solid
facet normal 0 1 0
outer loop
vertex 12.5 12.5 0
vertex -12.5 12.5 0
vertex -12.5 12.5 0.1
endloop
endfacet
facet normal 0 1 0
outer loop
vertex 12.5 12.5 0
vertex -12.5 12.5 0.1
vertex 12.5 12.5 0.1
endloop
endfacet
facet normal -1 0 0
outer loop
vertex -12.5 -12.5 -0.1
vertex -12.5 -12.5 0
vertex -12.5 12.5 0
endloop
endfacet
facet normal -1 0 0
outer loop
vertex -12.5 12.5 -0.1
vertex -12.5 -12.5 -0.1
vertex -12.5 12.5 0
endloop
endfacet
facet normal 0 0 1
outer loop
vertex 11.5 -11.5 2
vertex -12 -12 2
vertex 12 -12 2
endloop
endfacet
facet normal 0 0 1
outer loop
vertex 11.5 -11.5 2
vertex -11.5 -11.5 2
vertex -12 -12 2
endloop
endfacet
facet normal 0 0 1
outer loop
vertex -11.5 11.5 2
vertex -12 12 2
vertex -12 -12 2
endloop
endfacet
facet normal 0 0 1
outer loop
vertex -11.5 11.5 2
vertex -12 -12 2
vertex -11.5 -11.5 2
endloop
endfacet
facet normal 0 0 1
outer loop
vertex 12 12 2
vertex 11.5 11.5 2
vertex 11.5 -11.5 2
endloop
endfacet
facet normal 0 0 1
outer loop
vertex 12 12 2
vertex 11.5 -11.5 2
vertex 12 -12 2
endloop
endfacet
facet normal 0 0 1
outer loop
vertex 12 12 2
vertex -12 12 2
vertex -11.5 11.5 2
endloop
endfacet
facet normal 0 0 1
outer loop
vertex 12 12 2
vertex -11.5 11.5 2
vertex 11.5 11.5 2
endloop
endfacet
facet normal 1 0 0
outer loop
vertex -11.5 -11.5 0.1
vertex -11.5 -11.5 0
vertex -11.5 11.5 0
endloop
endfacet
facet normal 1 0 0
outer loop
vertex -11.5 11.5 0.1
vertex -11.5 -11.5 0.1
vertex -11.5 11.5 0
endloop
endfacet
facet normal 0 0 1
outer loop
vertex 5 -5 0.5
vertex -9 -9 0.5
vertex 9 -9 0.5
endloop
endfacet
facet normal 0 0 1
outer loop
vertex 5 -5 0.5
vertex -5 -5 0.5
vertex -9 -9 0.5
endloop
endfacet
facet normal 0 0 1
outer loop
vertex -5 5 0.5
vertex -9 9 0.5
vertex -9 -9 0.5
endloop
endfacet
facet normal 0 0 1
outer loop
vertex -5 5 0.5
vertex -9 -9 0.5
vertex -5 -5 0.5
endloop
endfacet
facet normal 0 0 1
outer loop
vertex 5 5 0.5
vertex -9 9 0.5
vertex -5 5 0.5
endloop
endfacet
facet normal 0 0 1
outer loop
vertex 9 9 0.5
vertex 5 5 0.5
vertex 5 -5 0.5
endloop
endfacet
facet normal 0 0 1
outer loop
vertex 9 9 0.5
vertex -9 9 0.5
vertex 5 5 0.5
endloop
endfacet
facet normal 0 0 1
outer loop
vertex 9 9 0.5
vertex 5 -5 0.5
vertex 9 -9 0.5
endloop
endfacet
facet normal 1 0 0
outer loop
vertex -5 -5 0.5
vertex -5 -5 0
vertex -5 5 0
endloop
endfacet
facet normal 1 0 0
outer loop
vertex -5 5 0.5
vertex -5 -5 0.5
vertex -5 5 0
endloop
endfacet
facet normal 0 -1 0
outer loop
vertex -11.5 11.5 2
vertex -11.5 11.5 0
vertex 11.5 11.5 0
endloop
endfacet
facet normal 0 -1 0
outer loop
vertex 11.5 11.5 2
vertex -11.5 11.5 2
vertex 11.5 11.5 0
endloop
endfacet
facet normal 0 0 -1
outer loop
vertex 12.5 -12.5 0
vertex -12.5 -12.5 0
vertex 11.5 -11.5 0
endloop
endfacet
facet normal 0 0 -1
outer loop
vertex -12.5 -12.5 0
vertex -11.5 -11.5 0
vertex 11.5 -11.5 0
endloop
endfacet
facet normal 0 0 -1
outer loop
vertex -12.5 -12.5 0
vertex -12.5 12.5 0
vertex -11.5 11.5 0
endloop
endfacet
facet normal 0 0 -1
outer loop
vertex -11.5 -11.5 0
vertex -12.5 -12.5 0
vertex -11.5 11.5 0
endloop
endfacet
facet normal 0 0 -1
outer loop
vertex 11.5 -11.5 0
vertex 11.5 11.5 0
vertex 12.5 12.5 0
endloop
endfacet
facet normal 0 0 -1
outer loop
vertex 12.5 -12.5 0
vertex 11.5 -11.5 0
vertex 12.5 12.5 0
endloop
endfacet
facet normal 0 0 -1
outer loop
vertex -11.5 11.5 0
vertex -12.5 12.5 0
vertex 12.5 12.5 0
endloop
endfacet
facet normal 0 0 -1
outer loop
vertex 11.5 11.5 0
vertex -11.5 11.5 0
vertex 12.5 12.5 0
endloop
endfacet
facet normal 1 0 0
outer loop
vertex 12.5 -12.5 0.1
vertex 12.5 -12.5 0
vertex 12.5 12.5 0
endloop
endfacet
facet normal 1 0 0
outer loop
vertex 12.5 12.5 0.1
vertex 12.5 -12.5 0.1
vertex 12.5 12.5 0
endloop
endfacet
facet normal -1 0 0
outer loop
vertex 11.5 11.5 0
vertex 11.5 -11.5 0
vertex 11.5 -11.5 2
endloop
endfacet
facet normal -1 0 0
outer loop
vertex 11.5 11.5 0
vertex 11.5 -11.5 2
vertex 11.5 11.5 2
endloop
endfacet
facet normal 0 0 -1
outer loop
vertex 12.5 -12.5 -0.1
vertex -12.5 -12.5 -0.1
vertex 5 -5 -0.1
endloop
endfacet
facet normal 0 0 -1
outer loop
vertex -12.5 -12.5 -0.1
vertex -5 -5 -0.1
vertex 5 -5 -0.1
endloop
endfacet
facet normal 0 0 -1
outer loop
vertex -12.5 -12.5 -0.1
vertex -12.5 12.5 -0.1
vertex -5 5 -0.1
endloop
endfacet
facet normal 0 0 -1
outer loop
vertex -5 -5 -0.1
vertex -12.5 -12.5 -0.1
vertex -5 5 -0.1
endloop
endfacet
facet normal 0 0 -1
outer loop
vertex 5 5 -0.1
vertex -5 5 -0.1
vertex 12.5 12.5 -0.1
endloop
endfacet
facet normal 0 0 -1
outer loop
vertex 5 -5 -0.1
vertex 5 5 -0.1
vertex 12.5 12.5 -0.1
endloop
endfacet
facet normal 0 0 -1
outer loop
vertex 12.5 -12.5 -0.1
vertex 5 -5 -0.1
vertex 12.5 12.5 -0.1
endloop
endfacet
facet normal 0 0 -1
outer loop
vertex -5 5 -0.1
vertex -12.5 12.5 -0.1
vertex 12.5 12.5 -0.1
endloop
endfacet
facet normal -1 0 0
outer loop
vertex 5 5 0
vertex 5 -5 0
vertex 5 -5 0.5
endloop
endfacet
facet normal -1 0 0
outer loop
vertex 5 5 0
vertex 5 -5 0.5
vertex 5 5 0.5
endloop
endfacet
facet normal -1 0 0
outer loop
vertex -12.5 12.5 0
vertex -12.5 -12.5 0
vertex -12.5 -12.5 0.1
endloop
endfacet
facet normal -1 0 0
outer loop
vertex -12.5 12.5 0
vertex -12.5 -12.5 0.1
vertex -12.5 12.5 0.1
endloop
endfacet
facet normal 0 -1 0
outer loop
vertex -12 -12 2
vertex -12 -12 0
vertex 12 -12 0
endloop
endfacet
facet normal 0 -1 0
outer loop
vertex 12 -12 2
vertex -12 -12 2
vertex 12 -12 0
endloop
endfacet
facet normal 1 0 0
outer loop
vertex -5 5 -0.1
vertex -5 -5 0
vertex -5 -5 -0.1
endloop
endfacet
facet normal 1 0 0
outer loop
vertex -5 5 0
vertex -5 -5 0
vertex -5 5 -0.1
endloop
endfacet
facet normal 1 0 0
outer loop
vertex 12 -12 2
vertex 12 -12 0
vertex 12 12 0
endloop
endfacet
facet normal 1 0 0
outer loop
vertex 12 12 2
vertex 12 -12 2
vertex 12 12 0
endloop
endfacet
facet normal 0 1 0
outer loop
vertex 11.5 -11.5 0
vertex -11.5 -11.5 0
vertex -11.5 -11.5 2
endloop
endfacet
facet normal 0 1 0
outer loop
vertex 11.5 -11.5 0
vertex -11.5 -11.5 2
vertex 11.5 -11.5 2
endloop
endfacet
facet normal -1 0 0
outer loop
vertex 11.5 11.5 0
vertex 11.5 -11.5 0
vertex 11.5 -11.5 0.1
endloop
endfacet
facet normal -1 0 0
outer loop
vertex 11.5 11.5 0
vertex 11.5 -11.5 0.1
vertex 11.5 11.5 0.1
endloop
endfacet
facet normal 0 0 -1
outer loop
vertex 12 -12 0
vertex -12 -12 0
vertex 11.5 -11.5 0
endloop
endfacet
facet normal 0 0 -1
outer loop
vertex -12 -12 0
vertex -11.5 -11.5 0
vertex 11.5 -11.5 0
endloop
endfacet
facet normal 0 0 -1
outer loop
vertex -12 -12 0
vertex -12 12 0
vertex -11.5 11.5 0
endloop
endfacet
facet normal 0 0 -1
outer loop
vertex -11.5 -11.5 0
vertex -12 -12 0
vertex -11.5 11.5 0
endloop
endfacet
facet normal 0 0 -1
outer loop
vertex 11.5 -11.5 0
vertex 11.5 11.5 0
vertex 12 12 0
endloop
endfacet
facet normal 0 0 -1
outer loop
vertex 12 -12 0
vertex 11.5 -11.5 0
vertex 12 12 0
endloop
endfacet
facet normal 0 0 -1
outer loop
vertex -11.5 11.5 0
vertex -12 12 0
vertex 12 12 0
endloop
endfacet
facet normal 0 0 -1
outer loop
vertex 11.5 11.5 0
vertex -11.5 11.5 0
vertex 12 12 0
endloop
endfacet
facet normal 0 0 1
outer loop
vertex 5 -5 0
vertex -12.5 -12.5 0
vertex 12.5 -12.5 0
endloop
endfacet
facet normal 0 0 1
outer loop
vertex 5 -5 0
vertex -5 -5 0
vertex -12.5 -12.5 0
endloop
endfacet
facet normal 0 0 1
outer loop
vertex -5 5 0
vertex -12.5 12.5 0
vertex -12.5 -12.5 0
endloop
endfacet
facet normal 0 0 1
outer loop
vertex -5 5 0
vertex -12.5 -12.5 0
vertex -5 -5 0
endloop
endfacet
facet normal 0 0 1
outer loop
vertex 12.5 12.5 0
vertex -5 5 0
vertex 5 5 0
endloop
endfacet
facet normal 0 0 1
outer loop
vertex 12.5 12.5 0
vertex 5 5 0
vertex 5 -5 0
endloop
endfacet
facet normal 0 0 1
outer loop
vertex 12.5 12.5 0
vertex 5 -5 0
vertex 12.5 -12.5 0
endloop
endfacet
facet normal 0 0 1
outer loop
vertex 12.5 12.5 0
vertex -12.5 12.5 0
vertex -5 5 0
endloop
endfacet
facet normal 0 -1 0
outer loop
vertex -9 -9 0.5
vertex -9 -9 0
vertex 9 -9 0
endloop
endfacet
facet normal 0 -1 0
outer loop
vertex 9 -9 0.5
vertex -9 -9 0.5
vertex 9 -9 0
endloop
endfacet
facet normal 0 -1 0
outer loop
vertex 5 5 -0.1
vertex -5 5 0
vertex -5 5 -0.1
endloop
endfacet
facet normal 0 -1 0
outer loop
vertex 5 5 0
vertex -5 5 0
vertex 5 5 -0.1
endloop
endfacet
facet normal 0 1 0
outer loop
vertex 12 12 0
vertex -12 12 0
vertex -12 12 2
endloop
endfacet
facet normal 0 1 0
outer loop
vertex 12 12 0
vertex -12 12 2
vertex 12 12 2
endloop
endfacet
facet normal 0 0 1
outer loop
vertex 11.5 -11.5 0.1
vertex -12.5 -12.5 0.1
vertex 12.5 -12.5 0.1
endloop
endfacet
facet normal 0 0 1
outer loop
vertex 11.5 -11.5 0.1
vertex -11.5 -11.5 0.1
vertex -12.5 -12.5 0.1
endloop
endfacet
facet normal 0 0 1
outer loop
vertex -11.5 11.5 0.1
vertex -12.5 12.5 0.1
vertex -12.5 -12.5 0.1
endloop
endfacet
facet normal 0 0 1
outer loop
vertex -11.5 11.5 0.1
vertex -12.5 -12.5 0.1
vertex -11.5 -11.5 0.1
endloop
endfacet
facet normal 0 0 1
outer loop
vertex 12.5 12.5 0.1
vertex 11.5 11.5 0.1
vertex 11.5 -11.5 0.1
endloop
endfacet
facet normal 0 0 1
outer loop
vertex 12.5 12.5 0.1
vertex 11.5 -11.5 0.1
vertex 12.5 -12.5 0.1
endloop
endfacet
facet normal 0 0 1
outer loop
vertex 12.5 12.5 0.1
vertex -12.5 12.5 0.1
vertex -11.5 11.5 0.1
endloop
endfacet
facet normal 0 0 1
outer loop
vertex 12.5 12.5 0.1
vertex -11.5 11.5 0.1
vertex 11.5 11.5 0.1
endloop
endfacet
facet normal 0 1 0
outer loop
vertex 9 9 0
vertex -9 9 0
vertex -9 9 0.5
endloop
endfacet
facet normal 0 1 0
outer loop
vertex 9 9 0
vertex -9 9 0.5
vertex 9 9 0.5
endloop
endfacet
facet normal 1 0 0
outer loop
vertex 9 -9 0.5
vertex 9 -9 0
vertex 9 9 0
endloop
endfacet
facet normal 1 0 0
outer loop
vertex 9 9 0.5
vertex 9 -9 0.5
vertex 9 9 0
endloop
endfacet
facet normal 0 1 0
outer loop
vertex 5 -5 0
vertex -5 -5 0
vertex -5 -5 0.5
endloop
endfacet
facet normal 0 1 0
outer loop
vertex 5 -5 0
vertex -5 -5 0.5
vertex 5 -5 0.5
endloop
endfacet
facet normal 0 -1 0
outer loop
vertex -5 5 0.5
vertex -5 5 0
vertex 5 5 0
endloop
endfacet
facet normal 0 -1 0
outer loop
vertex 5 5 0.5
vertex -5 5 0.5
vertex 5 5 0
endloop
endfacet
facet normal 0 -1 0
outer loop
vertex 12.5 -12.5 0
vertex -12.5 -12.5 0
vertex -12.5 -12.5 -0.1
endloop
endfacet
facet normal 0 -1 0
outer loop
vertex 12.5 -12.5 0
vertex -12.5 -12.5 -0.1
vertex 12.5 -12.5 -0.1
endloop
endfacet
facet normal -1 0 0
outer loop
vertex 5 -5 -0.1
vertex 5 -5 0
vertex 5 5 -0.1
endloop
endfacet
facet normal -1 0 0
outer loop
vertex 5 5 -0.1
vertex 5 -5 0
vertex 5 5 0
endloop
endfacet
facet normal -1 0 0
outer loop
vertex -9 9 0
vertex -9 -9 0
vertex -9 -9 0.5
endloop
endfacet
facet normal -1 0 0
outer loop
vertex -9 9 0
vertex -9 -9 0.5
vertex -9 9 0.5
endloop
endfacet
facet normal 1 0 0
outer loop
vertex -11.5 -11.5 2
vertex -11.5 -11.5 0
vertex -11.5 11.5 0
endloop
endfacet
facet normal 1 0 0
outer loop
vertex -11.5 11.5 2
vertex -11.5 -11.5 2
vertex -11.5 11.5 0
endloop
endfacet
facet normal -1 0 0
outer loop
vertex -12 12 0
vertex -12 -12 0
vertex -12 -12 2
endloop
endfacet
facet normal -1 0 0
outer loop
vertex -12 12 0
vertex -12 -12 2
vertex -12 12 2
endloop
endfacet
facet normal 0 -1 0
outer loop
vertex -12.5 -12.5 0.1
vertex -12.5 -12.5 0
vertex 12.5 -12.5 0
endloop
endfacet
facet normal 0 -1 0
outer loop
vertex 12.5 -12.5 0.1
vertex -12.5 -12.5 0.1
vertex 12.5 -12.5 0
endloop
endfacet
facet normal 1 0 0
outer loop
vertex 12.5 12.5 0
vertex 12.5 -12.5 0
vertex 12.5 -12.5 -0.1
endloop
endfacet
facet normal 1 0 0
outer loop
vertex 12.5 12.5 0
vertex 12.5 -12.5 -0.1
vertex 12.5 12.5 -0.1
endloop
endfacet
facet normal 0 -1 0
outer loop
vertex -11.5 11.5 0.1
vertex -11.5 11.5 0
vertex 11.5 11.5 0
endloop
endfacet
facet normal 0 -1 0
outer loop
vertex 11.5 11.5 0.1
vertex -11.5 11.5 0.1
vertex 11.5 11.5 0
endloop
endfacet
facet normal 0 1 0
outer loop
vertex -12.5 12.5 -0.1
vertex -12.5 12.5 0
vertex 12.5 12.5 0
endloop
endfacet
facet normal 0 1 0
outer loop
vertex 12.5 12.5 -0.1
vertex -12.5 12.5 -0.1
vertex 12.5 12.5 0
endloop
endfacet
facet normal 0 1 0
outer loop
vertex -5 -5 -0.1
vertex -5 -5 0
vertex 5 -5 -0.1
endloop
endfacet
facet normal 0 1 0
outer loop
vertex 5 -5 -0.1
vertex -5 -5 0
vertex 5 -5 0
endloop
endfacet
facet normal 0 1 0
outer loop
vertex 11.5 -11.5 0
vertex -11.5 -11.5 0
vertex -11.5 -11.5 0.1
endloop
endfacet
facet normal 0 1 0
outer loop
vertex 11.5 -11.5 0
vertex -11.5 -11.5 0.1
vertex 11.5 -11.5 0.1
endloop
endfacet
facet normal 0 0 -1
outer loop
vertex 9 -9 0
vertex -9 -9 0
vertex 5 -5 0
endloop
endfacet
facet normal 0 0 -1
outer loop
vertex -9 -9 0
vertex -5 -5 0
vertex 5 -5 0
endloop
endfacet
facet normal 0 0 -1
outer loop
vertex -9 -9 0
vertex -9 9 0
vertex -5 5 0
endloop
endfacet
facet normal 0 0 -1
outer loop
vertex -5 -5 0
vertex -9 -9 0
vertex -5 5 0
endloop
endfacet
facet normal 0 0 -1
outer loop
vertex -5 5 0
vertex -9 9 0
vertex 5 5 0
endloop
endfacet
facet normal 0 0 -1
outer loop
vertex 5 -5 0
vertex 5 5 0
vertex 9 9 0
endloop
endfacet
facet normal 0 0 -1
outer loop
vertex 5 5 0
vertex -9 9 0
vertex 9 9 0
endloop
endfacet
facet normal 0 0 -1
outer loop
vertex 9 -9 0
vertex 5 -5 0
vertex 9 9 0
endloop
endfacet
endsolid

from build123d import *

# Parameters (mm, degrees)
F0_W     = 18
F0_H     = 18
F0_W_2   = 10
F0_H_2   = 10
F1_DEPTH = 0.5
F2_W     = 25
F2_H     = 25
F2_W_2   = 23
F2_H_2   = 23
F3_DEPTH = 0.1
F4_W     = 25
F4_H     = 25
F4_W_2   = 10
F4_H_2   = 10
F5_DEPTH = 0.1
F6_W     = 24
F6_H     = 24
F6_W_2   = 23
F6_H_2   = 23
F7_DEPTH = 2


with BuildPart() as f1:
    # F0 (on Top) → F1 (new body)
    with BuildSketch(Plane.XY):
        Rectangle(F0_W, F0_H)
        Rectangle(F0_W_2, F0_H_2, mode=Mode.SUBTRACT)
    extrude(amount=F1_DEPTH)


with BuildPart() as f3:
    # F2 (on Top) → F3 (new body)
    with BuildSketch(Plane.XY):
        Rectangle(F2_W, F2_H)
        Rectangle(F2_W_2, F2_H_2, mode=Mode.SUBTRACT)
    extrude(amount=F3_DEPTH)


with BuildPart() as f5:
    # F4 (on Top) → F5 (new body)
    with BuildSketch(Plane.XY):
        Rectangle(F4_W, F4_H)
        Rectangle(F4_W_2, F4_H_2, mode=Mode.SUBTRACT)
    extrude(amount=-F5_DEPTH)


with BuildPart() as f7:
    # F6 (on Top) → F7 (new body)
    with BuildSketch(Plane.XY):
        Rectangle(F6_W, F6_H)
        Rectangle(F6_W_2, F6_H_2, mode=Mode.SUBTRACT)
    extrude(amount=F7_DEPTH)


solid = Compound([f1.part, f3.part, f5.part, f7.part])
